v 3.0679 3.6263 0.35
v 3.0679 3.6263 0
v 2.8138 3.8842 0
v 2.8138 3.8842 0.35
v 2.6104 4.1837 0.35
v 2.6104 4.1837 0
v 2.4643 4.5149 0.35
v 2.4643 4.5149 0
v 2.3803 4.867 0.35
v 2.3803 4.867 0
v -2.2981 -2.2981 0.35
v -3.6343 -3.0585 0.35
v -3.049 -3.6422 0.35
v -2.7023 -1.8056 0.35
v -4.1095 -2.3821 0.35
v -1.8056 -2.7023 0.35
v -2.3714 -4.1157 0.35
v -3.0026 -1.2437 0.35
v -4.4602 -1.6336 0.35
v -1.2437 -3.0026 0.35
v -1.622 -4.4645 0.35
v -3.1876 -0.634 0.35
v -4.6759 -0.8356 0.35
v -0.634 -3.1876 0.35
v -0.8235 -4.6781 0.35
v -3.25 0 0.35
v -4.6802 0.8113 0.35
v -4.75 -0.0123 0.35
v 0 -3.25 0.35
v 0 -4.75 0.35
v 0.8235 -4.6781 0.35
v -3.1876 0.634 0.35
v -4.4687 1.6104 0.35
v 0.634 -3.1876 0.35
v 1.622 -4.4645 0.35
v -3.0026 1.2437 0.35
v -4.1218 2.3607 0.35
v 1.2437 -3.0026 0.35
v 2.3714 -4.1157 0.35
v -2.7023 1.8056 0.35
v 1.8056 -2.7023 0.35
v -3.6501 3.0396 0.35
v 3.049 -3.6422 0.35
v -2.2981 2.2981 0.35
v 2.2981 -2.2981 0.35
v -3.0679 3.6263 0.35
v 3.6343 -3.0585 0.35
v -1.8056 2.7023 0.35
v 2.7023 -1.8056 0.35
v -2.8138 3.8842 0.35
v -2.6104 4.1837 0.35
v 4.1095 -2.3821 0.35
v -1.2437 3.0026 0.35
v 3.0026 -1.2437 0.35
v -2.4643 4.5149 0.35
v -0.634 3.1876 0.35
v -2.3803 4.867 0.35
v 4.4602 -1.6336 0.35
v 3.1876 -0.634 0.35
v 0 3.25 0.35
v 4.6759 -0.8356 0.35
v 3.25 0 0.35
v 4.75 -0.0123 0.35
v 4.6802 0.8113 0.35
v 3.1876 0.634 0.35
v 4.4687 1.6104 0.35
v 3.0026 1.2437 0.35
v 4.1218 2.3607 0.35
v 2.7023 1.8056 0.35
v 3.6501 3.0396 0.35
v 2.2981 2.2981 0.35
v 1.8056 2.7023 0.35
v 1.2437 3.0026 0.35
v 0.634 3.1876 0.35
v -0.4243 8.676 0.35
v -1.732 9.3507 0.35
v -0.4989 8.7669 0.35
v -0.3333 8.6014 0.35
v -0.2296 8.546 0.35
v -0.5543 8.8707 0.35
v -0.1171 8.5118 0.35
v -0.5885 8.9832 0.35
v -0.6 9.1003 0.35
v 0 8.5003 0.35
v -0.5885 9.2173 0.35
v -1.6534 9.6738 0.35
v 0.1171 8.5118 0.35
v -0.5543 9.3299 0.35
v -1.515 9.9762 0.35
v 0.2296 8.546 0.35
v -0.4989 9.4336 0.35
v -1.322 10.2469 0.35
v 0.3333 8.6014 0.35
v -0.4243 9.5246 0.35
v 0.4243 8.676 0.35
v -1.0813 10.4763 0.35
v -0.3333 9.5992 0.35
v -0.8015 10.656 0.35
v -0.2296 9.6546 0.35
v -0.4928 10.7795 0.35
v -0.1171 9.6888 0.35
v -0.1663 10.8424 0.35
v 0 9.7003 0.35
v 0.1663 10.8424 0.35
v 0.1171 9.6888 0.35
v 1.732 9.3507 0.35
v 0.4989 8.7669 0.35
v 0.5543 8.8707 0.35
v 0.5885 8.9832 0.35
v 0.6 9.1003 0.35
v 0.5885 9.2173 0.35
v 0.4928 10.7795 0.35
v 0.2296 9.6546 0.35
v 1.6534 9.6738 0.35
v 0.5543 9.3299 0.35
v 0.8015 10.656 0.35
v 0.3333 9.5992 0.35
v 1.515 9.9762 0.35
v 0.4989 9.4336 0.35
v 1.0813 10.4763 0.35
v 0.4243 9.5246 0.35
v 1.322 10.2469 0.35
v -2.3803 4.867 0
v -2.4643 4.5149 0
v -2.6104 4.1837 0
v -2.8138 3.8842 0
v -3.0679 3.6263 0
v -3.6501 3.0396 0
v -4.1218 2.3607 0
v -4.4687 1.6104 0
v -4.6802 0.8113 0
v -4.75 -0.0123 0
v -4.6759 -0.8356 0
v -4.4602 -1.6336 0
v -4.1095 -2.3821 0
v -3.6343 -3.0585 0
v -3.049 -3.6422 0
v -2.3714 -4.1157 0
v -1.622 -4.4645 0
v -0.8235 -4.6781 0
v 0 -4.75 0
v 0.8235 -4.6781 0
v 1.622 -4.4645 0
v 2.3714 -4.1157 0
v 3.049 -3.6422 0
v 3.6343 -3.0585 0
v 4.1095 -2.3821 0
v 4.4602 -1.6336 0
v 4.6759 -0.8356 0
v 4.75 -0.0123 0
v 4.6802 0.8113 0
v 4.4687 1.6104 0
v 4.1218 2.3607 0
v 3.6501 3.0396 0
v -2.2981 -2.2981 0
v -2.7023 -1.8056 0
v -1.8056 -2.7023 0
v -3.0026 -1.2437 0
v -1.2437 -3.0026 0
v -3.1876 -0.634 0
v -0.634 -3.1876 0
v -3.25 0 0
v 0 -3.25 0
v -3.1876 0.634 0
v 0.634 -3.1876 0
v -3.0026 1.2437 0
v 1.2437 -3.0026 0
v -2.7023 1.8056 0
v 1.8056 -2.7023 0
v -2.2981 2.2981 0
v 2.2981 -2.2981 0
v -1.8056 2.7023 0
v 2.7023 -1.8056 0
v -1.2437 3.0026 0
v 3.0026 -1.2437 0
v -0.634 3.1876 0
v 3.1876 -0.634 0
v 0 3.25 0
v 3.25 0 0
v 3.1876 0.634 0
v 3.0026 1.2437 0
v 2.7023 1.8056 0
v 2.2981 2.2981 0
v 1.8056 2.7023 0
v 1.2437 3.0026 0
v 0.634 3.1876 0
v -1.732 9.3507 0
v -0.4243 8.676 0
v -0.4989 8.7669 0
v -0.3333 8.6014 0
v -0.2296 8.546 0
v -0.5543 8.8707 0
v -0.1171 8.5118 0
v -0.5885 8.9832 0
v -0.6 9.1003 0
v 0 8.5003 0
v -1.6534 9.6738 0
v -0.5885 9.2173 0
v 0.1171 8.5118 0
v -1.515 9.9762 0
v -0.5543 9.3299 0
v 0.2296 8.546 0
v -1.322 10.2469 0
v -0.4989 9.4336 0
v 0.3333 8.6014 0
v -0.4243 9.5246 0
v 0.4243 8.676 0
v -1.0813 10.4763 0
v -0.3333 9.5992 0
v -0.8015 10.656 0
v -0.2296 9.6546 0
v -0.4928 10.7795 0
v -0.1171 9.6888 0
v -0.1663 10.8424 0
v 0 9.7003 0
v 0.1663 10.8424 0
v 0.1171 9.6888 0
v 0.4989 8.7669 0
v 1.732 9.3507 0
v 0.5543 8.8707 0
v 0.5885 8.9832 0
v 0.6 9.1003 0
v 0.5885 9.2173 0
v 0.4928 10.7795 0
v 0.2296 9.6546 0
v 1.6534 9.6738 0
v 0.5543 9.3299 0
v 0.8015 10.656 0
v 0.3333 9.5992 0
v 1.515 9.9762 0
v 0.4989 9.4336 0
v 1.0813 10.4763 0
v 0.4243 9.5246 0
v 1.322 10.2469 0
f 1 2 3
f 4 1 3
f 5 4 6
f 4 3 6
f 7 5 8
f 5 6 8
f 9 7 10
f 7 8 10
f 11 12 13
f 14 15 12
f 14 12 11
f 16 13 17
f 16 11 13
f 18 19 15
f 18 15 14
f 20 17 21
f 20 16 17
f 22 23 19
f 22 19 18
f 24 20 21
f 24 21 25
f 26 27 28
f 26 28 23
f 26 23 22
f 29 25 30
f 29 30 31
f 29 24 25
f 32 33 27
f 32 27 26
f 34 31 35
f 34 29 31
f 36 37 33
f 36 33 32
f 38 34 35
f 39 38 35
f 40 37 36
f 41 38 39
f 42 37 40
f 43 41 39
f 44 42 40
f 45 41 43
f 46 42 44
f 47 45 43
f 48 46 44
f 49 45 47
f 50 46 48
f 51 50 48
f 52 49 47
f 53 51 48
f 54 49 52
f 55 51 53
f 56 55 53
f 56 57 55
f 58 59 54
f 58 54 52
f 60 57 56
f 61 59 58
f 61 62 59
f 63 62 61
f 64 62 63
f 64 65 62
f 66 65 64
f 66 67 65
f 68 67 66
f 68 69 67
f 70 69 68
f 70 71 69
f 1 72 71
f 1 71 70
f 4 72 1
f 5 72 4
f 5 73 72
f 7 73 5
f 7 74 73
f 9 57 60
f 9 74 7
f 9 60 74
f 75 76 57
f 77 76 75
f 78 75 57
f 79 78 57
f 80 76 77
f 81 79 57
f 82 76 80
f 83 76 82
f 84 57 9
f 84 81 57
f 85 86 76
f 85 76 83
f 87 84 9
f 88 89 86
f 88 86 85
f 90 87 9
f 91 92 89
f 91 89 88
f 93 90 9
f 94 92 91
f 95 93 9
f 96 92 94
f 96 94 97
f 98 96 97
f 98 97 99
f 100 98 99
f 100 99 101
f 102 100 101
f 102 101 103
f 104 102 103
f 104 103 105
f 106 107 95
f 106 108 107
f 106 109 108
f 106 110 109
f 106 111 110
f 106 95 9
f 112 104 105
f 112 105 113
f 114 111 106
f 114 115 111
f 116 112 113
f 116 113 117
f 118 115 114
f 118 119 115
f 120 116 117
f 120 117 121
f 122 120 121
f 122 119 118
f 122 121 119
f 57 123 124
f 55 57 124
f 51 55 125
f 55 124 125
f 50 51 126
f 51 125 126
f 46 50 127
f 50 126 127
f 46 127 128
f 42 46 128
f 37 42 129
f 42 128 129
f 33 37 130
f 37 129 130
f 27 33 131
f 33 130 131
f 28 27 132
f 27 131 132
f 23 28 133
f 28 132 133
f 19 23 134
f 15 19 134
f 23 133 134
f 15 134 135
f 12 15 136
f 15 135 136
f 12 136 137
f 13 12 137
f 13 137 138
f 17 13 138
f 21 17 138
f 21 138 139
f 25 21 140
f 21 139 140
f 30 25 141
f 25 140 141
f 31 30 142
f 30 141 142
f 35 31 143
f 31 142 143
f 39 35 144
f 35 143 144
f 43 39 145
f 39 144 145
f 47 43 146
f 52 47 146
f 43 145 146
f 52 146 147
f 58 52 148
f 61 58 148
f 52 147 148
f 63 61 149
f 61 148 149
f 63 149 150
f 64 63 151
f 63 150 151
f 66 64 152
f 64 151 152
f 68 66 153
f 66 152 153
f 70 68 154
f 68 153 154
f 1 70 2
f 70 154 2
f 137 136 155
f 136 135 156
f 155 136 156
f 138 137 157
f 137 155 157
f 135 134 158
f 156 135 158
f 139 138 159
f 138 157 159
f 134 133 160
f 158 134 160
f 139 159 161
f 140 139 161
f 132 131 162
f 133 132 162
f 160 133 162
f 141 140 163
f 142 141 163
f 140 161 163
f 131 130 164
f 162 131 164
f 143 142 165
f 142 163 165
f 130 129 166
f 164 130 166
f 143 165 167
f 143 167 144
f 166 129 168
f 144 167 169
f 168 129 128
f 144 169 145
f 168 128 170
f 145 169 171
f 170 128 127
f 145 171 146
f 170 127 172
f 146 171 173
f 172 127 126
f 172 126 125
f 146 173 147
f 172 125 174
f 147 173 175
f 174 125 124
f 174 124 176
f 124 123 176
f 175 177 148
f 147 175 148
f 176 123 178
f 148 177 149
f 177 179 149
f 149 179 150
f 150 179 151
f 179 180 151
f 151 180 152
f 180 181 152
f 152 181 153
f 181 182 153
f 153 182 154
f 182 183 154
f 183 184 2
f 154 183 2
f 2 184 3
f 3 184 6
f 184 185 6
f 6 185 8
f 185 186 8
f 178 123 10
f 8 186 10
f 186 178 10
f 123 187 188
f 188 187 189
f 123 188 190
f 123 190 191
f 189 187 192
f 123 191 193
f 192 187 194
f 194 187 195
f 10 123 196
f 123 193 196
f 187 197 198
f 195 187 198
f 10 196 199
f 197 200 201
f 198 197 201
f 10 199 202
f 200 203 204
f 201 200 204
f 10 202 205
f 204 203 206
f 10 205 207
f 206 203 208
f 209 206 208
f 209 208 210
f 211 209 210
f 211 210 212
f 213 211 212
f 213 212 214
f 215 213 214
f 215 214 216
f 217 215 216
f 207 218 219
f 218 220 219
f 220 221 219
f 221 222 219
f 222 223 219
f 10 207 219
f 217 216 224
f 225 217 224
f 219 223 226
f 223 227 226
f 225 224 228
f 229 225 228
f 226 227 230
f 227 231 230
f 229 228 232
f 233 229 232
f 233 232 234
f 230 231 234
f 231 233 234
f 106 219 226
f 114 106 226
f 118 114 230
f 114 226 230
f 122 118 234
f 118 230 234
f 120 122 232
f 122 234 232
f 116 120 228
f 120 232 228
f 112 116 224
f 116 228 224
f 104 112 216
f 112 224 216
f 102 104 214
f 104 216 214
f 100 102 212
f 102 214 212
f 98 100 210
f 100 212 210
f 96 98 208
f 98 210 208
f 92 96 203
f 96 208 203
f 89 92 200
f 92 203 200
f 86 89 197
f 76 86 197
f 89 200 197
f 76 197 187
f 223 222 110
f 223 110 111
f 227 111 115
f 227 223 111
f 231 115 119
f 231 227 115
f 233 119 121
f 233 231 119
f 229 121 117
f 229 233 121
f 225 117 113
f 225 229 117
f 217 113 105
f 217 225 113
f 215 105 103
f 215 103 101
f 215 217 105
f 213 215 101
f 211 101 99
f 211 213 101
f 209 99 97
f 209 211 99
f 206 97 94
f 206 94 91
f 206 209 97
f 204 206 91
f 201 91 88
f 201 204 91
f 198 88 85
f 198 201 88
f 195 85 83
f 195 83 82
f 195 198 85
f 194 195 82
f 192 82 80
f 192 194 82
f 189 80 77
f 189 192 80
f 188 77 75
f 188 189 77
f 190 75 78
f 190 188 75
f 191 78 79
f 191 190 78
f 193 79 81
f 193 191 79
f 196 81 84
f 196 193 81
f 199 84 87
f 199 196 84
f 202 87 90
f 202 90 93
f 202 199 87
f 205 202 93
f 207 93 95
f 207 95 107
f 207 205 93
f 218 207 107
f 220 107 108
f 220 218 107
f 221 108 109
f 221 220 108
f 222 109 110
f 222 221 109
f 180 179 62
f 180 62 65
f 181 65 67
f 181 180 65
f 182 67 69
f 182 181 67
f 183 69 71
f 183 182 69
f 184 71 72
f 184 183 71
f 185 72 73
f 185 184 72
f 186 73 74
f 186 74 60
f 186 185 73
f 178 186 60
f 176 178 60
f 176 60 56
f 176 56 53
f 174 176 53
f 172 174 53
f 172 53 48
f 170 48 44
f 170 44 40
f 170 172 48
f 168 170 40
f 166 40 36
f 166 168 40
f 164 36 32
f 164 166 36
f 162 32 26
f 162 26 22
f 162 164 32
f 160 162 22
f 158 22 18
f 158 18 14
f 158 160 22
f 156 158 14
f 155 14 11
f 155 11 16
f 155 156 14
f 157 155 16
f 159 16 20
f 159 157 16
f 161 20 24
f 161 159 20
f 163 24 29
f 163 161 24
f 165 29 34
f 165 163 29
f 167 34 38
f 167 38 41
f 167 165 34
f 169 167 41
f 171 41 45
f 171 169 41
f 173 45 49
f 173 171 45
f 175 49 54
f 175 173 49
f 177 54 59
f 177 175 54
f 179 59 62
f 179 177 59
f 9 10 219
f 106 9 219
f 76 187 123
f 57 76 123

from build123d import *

# Parameters (mm, degrees)
SKETCH_1_R      = 3.25
SKETCH_1_R_2    = 0.6
EXTRUDE_1_DEPTH = 0.35


with BuildPart() as part:
    # Эскиз1 → Вытянуть1 (new body)
    with BuildSketch(Plane.XY):
        with BuildLine():
            Line((2.380261504, 4.86702901), (1.731990268, 9.350710913))
            ThreePointArc((1.731990268, 9.350710913), (0, 10.850291839), (-1.731990268, 9.350710913))
            Line((-1.731990268, 9.350710913), (-2.380261504, 4.86702901))
            ThreePointArc((-2.380261504, 4.86702901), (-2.610401545, 4.183671542), (-3.067922226, 3.626341575))
            ThreePointArc((-3.067922226, 3.626341575), (0, -4.75), (3.067922226, 3.626341575))
            ThreePointArc((3.067922226, 3.626341575), (2.610401545, 4.183671542), (2.380261504, 4.86702901))
        make_face()
        Circle(SKETCH_1_R, mode=Mode.SUBTRACT)
        with Locations((0, 9.100291839)):
            Circle(SKETCH_1_R_2, mode=Mode.SUBTRACT)
    extrude(amount=EXTRUDE_1_DEPTH)


solid = part.part
